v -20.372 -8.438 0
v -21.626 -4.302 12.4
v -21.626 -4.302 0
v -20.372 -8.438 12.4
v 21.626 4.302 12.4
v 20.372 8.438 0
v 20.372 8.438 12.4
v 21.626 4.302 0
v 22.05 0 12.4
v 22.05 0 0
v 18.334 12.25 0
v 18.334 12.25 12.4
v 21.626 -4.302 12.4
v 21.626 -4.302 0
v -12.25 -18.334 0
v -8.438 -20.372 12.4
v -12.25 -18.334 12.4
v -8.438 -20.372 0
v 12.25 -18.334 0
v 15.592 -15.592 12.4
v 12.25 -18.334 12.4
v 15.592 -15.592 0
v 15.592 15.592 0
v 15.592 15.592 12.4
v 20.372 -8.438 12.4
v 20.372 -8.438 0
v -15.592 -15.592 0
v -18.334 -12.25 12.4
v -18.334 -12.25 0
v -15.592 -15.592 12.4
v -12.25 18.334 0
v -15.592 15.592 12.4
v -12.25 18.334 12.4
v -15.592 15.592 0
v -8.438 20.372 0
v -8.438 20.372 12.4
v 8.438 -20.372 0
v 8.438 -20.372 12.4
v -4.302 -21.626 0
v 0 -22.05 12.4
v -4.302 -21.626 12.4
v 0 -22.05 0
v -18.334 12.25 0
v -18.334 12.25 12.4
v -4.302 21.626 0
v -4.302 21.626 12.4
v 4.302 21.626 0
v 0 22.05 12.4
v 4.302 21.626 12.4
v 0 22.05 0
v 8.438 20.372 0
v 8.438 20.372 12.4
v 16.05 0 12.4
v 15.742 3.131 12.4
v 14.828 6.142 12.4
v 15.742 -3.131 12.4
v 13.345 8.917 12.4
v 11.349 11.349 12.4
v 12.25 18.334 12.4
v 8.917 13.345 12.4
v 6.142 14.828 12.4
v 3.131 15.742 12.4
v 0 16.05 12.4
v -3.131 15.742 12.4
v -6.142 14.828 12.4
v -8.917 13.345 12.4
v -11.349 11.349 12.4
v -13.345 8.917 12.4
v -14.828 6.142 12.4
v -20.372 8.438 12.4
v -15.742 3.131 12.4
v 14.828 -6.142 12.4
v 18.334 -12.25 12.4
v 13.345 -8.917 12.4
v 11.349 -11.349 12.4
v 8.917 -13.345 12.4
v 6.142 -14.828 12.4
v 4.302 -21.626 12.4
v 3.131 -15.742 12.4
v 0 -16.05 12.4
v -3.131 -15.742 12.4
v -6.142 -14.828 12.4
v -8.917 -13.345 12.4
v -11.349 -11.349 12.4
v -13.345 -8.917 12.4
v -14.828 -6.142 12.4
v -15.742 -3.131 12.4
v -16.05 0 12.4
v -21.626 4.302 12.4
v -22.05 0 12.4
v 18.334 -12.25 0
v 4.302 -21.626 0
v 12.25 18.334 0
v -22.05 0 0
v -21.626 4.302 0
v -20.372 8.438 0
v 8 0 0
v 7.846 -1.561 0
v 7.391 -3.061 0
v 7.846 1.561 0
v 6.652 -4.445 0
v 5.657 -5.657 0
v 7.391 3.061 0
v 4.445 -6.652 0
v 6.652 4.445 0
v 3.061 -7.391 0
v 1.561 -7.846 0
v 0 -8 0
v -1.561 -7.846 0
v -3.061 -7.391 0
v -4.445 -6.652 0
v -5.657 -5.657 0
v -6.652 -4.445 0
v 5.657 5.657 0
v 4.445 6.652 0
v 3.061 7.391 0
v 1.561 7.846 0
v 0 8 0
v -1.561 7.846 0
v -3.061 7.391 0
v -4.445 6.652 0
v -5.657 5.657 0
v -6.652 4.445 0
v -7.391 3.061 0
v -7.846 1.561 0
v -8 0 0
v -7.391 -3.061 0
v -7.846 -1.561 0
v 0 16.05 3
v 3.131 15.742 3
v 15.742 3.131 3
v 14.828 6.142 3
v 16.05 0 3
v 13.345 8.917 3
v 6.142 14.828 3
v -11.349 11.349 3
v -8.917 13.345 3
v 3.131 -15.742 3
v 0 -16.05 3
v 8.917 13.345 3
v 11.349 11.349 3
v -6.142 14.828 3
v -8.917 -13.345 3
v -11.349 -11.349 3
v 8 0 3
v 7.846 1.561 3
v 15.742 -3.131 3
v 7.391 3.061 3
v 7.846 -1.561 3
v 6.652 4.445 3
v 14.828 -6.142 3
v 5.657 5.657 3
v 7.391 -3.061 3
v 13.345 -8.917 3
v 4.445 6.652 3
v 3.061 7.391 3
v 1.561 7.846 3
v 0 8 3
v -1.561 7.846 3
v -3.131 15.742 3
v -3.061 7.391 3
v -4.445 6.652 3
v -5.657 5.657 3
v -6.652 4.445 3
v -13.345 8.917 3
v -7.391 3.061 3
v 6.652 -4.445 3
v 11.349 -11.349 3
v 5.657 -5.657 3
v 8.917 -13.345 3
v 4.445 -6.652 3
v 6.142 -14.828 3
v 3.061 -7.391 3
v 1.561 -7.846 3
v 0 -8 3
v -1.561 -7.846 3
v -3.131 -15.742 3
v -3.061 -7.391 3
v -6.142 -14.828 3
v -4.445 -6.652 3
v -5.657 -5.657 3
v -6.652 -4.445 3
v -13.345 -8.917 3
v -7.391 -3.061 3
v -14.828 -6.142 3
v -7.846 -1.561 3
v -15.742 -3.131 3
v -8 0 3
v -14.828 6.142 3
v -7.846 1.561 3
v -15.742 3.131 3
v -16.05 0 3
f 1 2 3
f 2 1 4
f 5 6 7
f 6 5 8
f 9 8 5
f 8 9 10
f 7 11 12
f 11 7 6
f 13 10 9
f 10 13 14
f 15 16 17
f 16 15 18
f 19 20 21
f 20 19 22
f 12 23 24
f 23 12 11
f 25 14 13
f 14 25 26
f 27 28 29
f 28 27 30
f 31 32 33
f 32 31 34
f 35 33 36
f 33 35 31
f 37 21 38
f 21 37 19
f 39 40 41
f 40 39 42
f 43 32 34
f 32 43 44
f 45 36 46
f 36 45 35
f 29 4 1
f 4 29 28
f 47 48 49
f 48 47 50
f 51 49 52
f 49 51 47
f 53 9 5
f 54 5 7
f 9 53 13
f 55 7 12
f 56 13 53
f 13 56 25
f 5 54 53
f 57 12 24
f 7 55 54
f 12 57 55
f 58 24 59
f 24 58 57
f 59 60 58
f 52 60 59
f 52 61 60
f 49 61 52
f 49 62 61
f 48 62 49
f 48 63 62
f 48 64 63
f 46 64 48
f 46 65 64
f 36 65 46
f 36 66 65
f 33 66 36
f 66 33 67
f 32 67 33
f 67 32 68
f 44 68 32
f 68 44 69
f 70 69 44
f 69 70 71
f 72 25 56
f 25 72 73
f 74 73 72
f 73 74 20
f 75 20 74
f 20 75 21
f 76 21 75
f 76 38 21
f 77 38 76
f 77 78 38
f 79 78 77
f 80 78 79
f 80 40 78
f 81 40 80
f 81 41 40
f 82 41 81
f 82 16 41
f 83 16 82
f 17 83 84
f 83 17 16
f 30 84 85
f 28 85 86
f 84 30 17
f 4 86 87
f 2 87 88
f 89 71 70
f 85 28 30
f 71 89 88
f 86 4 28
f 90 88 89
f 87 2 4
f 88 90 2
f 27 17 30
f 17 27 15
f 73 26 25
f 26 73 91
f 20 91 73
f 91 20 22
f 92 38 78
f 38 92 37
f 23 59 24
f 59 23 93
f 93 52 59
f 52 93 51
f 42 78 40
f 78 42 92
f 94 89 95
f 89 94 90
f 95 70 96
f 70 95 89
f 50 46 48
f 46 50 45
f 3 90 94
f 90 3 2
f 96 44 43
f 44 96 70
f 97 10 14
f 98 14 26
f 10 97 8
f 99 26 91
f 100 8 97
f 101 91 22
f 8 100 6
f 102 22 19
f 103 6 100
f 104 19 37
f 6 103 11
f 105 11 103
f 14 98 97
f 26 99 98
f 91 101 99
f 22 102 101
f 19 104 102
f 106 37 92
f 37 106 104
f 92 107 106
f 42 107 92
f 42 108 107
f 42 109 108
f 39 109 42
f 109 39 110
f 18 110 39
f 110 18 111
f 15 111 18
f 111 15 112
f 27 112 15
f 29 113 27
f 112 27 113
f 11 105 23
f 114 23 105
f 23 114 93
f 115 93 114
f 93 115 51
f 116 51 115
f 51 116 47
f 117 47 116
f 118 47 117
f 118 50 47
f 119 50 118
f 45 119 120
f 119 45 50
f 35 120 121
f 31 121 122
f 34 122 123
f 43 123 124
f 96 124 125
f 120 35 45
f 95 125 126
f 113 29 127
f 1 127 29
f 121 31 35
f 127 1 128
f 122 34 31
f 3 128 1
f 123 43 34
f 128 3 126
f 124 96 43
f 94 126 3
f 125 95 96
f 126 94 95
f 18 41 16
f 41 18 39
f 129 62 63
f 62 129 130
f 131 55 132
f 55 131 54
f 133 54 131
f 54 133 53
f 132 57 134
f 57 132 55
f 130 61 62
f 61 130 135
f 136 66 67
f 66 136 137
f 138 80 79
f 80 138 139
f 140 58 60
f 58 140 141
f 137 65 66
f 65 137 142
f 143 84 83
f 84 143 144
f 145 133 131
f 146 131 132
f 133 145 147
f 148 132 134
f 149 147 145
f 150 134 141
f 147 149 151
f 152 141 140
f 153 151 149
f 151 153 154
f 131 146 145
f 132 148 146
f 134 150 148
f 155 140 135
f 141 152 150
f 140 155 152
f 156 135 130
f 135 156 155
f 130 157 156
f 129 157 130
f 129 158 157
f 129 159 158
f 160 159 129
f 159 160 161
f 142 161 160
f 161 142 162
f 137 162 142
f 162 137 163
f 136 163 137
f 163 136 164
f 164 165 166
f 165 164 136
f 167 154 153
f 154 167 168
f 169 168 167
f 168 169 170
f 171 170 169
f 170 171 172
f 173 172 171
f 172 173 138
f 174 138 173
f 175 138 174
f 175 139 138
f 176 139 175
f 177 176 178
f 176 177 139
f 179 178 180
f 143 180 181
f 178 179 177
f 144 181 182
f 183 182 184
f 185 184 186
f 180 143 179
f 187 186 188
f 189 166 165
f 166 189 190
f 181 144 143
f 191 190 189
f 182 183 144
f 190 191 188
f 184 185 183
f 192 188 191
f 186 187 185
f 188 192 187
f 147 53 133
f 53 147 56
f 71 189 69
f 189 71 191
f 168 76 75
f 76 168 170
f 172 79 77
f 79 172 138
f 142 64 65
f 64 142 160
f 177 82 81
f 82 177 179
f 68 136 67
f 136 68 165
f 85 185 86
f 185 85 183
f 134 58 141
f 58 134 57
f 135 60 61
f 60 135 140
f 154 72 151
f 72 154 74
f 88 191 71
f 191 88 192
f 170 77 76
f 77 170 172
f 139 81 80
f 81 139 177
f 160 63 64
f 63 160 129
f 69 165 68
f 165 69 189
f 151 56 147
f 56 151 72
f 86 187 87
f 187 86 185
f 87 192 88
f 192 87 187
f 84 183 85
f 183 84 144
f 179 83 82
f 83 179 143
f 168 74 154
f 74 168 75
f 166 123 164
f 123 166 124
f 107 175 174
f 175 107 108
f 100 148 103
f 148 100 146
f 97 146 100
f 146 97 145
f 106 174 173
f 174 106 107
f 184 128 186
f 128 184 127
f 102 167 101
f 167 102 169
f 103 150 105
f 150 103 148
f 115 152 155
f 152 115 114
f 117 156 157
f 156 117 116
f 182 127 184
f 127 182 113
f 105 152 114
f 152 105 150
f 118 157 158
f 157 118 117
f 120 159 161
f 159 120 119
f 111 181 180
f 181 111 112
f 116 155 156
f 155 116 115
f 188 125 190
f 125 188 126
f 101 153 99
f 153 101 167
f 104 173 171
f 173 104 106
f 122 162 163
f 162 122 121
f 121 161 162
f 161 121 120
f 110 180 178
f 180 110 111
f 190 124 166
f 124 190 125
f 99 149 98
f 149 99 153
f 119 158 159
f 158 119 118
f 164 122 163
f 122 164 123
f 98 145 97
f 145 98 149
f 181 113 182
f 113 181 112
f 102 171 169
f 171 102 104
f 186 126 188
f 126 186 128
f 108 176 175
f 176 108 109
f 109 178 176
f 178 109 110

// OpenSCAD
$fn = 32;

// ----------------------------------------------------------------------
// Bearing housing: seat for 6002 (32 x 9 mm), 44.1 mm body
// ----------------------------------------------------------------------

// --- parameters (mm) ---
body_od = 44.1;           // housing outside diameter
body_h = 12.4;            // overall housing height
wall = 6;                 // wall thickness
pocket_d = 32.1;          // 6002 seat, 0.1 mm clearance
seat_h = 9.4;             // pocket depth
shoulder = 3;             // shoulder under the bearing
pass_d = 16;              // shaft passage

module body() {
  cylinder(h = body_h, d = body_od);
}

difference() {
  union() {
    body();
  }
  translate([0, 0, body_h - seat_h]) cylinder(h = seat_h + 1, d = pocket_d);
  translate([0, 0, -1]) cylinder(h = body_h - seat_h + 1, d = pass_d);
}
